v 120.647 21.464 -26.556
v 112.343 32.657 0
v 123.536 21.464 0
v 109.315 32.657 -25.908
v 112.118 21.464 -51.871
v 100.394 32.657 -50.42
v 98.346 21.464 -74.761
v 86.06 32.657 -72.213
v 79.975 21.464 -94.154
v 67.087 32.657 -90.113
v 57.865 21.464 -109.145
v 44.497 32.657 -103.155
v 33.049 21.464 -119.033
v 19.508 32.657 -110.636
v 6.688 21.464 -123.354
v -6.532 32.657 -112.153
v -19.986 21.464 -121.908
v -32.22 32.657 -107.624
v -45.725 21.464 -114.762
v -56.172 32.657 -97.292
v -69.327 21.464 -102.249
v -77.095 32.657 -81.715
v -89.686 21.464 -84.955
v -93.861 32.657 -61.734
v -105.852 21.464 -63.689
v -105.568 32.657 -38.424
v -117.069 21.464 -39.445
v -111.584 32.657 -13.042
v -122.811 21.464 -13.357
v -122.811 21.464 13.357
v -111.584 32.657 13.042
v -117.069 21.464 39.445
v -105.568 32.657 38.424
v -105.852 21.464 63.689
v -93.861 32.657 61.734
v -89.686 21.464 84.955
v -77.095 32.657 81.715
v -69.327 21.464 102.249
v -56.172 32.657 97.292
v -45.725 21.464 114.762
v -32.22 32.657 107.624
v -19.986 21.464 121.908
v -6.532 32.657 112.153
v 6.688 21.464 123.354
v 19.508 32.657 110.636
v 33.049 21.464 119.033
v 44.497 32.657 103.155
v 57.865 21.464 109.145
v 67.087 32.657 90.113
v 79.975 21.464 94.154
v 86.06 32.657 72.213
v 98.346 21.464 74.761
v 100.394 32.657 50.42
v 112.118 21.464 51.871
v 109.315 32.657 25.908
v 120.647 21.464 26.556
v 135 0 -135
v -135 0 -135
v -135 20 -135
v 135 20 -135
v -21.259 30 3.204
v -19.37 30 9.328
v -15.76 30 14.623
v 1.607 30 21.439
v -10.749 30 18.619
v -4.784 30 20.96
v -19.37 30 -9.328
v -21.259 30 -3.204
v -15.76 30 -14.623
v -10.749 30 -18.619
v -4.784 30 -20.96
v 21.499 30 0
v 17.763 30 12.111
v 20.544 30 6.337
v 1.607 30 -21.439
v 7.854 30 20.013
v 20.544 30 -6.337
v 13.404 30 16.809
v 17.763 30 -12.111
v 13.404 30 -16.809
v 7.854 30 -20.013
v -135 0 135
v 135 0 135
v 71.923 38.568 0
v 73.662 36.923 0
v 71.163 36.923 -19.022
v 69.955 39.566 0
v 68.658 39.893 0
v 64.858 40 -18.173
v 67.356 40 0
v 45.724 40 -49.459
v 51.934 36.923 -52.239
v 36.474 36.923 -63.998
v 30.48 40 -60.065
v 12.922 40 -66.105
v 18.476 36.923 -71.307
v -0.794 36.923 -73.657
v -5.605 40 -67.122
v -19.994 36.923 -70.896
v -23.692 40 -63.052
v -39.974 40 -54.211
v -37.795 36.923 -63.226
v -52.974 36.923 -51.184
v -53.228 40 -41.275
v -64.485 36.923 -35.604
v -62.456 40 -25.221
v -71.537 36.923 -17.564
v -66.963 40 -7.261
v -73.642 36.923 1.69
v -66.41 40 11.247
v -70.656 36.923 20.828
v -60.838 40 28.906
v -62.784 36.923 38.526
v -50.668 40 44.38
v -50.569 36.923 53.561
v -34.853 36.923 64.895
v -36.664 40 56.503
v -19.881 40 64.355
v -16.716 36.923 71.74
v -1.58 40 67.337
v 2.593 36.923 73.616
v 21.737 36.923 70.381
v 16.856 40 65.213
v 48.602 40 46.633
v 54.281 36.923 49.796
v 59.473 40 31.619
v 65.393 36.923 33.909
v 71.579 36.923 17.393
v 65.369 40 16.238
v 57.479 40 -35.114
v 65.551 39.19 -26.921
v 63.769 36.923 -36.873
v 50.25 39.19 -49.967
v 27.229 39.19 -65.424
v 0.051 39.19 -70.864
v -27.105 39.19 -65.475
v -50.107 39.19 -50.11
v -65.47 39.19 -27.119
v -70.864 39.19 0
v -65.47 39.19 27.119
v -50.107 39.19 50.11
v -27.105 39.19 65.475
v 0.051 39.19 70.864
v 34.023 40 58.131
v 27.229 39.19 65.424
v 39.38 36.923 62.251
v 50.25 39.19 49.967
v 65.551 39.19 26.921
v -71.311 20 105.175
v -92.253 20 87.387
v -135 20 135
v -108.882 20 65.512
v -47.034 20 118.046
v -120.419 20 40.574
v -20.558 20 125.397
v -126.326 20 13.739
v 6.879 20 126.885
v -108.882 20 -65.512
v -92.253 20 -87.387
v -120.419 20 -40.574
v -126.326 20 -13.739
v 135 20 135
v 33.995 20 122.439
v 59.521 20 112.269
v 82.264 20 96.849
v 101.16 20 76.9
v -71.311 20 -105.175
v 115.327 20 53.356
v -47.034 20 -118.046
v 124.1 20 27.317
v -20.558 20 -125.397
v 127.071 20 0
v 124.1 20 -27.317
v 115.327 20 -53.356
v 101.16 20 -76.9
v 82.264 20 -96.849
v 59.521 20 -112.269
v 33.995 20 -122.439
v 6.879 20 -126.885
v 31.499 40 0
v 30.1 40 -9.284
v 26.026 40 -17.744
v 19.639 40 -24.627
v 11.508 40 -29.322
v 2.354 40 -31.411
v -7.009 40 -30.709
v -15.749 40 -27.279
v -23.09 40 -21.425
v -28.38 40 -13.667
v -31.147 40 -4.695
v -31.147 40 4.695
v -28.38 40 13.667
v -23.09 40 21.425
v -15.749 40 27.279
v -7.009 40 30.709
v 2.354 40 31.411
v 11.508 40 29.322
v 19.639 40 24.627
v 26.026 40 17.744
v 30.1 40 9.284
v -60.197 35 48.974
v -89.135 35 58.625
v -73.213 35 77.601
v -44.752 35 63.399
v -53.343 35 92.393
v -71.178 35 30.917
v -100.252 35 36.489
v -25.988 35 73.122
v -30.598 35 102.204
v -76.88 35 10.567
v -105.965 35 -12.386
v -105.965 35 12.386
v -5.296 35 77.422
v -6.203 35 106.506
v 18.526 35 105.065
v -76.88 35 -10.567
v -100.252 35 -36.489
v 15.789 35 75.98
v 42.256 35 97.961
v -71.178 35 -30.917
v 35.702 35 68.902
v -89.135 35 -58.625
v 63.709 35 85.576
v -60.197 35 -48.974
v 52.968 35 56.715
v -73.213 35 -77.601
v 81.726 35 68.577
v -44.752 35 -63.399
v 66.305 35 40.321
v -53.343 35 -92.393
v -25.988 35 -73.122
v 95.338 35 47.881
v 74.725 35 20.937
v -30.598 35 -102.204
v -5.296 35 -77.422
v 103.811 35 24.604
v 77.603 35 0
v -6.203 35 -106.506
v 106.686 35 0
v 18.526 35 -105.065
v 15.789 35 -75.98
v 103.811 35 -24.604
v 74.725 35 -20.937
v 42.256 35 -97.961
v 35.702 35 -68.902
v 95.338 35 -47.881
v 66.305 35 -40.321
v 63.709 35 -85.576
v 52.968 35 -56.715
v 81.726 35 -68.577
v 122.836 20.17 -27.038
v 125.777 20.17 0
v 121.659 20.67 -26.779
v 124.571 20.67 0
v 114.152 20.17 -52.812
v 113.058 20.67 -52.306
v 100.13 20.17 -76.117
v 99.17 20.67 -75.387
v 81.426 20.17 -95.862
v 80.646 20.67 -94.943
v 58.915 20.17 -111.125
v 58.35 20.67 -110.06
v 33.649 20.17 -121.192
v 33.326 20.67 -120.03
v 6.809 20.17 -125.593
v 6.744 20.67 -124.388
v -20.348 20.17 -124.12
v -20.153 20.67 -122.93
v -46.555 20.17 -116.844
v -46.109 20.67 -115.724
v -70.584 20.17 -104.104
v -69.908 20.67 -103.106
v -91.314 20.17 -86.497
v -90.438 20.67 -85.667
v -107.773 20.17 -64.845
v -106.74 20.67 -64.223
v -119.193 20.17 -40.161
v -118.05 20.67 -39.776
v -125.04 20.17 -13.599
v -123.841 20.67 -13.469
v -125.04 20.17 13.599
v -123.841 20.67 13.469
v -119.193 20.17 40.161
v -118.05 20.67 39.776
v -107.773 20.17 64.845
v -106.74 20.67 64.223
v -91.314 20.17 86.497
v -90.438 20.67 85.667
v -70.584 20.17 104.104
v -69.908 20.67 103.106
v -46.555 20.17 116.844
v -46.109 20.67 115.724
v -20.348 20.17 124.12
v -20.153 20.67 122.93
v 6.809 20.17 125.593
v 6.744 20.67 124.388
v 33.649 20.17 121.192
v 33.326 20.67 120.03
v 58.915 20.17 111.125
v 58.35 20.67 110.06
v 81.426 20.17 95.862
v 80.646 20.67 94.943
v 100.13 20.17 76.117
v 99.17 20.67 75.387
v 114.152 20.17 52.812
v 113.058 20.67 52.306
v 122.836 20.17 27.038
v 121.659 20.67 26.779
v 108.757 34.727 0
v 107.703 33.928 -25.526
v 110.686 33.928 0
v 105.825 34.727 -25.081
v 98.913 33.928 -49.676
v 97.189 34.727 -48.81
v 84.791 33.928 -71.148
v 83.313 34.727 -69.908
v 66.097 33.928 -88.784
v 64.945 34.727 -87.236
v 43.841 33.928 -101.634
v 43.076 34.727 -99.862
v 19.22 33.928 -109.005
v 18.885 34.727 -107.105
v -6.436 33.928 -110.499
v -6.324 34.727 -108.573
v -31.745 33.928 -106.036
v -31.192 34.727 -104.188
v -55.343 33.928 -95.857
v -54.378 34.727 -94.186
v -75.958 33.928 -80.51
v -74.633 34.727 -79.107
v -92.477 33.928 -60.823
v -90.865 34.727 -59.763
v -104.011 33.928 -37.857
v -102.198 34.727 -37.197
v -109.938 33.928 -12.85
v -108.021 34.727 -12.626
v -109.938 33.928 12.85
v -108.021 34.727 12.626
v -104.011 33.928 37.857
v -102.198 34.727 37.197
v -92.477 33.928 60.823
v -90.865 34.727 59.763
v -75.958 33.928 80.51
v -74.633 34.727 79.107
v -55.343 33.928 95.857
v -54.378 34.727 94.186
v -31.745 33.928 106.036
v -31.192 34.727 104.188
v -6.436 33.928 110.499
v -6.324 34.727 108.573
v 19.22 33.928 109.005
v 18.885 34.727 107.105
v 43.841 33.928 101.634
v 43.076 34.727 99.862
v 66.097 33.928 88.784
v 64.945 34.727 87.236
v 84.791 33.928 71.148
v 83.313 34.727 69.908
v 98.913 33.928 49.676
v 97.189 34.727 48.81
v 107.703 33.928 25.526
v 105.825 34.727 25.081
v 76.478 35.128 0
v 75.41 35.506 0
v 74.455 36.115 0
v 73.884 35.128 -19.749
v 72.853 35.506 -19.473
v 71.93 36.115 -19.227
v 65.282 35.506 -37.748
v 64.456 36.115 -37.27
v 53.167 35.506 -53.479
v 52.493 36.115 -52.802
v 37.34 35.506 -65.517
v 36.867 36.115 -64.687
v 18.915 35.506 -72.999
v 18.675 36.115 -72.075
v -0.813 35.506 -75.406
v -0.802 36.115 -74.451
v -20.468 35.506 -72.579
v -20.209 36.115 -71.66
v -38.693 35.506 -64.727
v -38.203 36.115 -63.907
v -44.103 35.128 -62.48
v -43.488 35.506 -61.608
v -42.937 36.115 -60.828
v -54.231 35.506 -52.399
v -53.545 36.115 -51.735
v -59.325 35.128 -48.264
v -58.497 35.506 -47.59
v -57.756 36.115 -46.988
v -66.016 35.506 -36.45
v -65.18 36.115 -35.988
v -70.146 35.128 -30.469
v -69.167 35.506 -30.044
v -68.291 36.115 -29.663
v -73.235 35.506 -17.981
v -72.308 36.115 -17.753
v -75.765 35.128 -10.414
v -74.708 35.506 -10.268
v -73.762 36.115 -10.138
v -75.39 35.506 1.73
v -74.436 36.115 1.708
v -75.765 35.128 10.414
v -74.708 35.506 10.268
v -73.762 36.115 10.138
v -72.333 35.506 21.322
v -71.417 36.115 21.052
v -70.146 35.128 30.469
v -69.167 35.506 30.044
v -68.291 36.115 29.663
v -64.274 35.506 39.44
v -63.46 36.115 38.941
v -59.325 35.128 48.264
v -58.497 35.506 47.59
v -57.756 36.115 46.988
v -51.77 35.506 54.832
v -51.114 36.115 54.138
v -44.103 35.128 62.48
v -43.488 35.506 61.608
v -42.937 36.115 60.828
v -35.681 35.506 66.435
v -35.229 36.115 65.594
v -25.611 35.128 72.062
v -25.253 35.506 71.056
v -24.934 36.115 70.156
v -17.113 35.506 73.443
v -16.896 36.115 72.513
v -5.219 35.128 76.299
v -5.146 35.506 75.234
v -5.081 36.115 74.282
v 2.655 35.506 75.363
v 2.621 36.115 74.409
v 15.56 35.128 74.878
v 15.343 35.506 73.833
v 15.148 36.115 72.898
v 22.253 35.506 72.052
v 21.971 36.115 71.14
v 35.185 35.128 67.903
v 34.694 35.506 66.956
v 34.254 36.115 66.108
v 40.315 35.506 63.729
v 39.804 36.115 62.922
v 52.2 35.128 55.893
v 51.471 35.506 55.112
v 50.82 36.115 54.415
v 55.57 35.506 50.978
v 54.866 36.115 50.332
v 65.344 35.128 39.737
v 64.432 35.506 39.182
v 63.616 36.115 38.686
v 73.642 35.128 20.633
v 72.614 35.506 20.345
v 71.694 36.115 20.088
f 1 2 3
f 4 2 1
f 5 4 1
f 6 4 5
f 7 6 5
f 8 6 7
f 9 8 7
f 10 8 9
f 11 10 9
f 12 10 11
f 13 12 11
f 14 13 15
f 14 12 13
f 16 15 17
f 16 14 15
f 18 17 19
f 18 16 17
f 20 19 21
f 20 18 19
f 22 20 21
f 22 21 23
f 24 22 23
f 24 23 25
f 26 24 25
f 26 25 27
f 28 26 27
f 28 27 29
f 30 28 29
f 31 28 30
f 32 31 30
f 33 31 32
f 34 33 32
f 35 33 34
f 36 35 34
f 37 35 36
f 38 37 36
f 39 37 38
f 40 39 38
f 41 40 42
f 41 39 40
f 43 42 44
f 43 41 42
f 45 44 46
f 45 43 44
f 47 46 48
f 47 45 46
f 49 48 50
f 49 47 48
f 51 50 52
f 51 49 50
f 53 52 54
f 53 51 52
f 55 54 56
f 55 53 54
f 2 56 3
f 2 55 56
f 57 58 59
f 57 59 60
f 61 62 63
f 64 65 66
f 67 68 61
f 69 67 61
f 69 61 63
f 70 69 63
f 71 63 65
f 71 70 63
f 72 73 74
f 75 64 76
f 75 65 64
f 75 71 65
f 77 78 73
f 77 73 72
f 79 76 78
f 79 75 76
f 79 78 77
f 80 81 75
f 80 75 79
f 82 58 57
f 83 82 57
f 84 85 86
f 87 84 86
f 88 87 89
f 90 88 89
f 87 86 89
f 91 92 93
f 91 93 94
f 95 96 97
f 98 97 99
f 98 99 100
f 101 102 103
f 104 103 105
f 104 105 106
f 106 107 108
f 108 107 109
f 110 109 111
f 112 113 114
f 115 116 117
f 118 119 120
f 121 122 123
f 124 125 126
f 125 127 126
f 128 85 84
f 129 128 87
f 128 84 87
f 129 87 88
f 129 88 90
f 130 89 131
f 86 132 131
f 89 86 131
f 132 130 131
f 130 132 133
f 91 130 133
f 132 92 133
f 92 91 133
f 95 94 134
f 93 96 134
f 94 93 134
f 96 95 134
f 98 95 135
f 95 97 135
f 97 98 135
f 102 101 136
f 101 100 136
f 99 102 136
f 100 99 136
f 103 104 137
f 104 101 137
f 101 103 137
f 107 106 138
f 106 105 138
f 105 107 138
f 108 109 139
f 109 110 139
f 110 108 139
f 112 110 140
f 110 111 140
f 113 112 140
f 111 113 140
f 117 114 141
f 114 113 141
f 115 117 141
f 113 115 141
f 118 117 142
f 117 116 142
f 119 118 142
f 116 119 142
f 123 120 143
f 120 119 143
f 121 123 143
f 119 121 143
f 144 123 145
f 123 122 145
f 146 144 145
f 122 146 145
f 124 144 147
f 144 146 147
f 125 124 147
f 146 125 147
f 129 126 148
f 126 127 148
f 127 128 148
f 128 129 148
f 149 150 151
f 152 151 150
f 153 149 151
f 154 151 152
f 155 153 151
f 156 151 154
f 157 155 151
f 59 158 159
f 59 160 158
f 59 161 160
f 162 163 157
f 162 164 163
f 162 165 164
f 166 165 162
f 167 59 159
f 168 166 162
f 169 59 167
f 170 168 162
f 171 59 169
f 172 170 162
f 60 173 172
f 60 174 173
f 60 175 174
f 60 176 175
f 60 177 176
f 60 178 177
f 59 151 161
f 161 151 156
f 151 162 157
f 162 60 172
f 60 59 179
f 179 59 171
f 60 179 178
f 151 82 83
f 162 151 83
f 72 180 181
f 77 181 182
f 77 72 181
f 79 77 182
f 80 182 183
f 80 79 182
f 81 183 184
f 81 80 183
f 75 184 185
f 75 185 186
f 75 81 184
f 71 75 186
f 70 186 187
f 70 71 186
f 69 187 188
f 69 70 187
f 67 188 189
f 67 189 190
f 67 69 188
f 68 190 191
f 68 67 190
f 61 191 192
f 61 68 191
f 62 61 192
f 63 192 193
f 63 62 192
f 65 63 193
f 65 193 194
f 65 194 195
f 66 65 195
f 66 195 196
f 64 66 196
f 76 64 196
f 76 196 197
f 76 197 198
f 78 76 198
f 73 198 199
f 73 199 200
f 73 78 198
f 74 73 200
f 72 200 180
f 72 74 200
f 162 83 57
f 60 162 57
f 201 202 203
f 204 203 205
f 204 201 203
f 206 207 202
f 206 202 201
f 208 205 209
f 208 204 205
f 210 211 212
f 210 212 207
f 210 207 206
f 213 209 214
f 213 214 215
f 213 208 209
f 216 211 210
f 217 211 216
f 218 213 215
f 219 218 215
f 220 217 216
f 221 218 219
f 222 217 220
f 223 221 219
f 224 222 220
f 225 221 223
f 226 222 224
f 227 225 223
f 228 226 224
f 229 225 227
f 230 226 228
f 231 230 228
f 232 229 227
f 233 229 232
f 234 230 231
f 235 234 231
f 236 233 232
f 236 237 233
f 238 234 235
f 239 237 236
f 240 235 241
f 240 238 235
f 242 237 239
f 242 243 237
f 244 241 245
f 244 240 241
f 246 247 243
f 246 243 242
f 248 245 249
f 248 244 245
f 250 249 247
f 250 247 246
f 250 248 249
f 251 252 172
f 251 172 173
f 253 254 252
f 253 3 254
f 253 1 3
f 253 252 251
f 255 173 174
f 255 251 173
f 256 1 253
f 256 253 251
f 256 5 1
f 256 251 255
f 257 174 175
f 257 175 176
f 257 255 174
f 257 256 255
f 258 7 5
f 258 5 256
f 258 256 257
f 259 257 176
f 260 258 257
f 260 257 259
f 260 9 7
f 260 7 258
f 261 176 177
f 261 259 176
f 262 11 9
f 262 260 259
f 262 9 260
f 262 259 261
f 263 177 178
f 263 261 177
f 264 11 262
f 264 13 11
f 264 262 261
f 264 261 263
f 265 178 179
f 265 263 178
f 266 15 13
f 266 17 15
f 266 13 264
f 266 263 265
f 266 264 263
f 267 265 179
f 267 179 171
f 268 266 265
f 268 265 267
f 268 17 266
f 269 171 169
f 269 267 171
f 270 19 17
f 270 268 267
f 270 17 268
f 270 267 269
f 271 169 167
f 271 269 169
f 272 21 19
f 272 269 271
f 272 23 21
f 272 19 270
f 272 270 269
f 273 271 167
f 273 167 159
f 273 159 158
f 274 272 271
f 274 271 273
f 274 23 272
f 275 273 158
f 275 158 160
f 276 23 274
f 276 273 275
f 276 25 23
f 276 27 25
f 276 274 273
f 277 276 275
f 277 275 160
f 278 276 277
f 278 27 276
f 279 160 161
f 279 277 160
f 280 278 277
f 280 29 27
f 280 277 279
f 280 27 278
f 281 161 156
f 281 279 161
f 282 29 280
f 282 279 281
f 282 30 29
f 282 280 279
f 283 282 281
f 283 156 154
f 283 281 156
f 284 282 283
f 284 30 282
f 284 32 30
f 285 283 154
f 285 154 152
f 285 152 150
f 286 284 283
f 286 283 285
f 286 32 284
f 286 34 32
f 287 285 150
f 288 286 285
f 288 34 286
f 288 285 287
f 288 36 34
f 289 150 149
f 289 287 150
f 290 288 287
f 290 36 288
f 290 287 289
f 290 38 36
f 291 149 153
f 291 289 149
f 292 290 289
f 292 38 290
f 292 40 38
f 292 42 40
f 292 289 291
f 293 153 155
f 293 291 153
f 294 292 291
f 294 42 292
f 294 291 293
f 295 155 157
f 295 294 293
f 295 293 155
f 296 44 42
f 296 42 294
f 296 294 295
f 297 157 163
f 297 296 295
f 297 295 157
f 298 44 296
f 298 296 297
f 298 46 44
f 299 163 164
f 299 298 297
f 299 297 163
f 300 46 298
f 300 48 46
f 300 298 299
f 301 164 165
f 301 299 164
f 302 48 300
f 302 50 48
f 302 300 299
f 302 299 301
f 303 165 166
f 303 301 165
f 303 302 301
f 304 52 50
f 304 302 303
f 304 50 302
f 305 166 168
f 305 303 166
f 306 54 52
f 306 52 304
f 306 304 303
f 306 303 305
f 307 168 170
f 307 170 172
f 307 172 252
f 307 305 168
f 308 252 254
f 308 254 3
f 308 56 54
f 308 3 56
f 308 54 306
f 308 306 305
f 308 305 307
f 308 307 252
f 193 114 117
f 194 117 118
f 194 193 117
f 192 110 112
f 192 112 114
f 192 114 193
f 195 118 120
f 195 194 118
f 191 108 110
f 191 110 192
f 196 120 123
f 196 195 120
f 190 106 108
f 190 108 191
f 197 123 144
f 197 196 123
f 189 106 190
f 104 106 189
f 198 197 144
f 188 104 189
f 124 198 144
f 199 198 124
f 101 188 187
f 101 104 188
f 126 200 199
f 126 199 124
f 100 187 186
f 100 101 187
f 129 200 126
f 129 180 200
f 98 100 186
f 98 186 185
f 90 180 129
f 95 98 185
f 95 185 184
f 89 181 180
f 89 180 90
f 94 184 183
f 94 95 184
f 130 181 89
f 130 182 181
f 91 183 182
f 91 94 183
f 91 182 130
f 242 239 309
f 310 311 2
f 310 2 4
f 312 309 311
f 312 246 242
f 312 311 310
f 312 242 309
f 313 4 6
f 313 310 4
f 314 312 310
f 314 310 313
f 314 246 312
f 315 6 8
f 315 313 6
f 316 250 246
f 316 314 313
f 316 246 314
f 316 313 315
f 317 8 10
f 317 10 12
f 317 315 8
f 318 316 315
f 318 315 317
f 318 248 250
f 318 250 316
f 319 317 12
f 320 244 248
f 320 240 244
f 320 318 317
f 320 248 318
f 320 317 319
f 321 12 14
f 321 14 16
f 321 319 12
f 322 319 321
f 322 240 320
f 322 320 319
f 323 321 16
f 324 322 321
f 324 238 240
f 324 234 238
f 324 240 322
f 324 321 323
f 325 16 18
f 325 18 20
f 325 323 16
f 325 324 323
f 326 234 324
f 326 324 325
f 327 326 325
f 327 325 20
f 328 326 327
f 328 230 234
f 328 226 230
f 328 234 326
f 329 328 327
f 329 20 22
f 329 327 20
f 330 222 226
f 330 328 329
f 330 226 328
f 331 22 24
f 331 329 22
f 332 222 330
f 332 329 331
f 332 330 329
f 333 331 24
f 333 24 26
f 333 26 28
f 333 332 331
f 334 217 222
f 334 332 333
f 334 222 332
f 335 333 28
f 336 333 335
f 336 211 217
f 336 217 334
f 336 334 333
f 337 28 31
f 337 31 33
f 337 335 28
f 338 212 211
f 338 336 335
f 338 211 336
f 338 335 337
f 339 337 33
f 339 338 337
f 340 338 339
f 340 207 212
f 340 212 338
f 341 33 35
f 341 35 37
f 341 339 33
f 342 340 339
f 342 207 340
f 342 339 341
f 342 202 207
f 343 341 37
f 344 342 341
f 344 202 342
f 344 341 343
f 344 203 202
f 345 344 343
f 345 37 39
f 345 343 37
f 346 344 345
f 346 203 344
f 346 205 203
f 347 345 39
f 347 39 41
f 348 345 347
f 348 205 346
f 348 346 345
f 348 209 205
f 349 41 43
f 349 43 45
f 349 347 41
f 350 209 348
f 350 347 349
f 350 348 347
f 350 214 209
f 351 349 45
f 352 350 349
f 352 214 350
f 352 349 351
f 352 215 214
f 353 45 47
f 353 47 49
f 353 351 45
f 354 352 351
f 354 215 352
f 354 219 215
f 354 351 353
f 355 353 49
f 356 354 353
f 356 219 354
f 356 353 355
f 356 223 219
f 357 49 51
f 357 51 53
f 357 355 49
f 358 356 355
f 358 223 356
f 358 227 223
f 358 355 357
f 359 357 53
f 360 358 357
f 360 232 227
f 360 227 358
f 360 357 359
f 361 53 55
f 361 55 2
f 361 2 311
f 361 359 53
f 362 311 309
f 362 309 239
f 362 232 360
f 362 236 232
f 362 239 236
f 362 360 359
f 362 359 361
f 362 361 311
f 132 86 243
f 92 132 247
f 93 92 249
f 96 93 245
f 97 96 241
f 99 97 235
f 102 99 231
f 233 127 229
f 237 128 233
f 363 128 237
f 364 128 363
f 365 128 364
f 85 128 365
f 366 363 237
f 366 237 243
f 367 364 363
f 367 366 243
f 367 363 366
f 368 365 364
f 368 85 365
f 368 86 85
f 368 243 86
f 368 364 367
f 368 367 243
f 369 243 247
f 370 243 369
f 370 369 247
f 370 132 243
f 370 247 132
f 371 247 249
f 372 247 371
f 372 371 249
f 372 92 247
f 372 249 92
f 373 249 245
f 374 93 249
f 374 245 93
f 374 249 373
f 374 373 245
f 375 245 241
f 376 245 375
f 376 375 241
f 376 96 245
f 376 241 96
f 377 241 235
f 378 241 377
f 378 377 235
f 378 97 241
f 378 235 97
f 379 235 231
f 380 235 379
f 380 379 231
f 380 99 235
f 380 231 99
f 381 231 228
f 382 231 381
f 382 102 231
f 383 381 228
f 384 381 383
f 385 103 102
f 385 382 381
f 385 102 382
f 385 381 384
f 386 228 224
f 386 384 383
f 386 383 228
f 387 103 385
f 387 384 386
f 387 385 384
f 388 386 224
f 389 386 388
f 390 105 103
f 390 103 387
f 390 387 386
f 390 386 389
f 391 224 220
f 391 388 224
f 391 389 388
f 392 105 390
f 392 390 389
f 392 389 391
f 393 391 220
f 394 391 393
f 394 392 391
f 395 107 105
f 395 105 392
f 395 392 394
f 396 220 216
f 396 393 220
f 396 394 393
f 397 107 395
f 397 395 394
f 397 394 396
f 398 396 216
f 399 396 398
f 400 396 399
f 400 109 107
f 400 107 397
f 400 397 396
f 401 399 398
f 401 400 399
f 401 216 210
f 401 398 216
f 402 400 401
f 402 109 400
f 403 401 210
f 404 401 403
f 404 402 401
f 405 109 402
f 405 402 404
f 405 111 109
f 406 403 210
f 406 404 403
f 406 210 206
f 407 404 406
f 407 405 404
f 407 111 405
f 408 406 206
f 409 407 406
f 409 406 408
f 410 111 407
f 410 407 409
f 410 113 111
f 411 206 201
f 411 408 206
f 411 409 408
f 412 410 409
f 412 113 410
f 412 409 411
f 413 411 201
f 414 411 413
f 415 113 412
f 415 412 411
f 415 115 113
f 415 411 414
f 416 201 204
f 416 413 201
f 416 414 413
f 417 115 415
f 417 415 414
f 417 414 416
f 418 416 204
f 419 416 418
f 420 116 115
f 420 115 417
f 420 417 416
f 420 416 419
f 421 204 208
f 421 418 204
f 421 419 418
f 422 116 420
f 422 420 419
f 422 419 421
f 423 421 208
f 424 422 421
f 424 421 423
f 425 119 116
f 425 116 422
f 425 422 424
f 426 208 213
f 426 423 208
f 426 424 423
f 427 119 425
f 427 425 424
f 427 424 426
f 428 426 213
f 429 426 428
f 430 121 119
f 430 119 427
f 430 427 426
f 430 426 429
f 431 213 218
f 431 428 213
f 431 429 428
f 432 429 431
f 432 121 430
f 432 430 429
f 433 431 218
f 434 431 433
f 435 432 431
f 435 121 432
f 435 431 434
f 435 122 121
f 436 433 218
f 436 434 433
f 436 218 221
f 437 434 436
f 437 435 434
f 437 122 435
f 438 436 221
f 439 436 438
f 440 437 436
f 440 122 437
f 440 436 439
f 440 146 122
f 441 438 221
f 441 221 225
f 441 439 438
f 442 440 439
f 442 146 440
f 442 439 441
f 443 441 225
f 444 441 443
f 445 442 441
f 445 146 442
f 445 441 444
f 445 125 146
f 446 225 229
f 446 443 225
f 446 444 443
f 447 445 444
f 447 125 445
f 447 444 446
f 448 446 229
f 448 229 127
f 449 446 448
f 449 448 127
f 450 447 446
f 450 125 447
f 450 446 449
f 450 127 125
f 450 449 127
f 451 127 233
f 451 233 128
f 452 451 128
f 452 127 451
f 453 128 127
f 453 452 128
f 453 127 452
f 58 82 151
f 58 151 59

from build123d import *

# Parameters (mm, degrees)
SKETCH_1_W      = 270
SKETCH_1_H      = 270
EXTRUDE_1_DEPTH = 20
FILLET_1_R      = 5
FILLET_2_R      = 8


with BuildPart() as part:
    # 草图1 → 凸台-拉伸1 (new body)
    with BuildSketch(Plane(origin=(0, 0, 0), x_dir=(1, 0, 0), z_dir=(0, 1, 0))):
        Rectangle(SKETCH_1_W, SKETCH_1_H)
    extrude(amount=EXTRUDE_1_DEPTH)

    # 草图2 → 旋转1 (revolve)
    with BuildSketch(Plane.XY):
        Polygon((0, 20), (125, 20), (110, 35), (75, 35), (71.498962309, 40), (31.498962309, 40), (21.498962309, 30), (0, 30), align=None)
    revolve(axis=Axis((0, 0, 0), (0, 1, 0)))

    # 圆角1
    fillet_1_edges = [part.edges().sort_by_distance(p)[0] for p in [
        (-125, 20, 0),
        (-75, 35, 0),
    ]]
    fillet(fillet_1_edges, radius=FILLET_1_R)

    # 圆角2
    fillet_2_edges = [part.edges().sort_by_distance(p)[0] for p in [
        (-71.498962309, 40, 0),
        (-110, 35, 0),
    ]]
    fillet(fillet_2_edges, radius=FILLET_2_R)


solid = part.part
